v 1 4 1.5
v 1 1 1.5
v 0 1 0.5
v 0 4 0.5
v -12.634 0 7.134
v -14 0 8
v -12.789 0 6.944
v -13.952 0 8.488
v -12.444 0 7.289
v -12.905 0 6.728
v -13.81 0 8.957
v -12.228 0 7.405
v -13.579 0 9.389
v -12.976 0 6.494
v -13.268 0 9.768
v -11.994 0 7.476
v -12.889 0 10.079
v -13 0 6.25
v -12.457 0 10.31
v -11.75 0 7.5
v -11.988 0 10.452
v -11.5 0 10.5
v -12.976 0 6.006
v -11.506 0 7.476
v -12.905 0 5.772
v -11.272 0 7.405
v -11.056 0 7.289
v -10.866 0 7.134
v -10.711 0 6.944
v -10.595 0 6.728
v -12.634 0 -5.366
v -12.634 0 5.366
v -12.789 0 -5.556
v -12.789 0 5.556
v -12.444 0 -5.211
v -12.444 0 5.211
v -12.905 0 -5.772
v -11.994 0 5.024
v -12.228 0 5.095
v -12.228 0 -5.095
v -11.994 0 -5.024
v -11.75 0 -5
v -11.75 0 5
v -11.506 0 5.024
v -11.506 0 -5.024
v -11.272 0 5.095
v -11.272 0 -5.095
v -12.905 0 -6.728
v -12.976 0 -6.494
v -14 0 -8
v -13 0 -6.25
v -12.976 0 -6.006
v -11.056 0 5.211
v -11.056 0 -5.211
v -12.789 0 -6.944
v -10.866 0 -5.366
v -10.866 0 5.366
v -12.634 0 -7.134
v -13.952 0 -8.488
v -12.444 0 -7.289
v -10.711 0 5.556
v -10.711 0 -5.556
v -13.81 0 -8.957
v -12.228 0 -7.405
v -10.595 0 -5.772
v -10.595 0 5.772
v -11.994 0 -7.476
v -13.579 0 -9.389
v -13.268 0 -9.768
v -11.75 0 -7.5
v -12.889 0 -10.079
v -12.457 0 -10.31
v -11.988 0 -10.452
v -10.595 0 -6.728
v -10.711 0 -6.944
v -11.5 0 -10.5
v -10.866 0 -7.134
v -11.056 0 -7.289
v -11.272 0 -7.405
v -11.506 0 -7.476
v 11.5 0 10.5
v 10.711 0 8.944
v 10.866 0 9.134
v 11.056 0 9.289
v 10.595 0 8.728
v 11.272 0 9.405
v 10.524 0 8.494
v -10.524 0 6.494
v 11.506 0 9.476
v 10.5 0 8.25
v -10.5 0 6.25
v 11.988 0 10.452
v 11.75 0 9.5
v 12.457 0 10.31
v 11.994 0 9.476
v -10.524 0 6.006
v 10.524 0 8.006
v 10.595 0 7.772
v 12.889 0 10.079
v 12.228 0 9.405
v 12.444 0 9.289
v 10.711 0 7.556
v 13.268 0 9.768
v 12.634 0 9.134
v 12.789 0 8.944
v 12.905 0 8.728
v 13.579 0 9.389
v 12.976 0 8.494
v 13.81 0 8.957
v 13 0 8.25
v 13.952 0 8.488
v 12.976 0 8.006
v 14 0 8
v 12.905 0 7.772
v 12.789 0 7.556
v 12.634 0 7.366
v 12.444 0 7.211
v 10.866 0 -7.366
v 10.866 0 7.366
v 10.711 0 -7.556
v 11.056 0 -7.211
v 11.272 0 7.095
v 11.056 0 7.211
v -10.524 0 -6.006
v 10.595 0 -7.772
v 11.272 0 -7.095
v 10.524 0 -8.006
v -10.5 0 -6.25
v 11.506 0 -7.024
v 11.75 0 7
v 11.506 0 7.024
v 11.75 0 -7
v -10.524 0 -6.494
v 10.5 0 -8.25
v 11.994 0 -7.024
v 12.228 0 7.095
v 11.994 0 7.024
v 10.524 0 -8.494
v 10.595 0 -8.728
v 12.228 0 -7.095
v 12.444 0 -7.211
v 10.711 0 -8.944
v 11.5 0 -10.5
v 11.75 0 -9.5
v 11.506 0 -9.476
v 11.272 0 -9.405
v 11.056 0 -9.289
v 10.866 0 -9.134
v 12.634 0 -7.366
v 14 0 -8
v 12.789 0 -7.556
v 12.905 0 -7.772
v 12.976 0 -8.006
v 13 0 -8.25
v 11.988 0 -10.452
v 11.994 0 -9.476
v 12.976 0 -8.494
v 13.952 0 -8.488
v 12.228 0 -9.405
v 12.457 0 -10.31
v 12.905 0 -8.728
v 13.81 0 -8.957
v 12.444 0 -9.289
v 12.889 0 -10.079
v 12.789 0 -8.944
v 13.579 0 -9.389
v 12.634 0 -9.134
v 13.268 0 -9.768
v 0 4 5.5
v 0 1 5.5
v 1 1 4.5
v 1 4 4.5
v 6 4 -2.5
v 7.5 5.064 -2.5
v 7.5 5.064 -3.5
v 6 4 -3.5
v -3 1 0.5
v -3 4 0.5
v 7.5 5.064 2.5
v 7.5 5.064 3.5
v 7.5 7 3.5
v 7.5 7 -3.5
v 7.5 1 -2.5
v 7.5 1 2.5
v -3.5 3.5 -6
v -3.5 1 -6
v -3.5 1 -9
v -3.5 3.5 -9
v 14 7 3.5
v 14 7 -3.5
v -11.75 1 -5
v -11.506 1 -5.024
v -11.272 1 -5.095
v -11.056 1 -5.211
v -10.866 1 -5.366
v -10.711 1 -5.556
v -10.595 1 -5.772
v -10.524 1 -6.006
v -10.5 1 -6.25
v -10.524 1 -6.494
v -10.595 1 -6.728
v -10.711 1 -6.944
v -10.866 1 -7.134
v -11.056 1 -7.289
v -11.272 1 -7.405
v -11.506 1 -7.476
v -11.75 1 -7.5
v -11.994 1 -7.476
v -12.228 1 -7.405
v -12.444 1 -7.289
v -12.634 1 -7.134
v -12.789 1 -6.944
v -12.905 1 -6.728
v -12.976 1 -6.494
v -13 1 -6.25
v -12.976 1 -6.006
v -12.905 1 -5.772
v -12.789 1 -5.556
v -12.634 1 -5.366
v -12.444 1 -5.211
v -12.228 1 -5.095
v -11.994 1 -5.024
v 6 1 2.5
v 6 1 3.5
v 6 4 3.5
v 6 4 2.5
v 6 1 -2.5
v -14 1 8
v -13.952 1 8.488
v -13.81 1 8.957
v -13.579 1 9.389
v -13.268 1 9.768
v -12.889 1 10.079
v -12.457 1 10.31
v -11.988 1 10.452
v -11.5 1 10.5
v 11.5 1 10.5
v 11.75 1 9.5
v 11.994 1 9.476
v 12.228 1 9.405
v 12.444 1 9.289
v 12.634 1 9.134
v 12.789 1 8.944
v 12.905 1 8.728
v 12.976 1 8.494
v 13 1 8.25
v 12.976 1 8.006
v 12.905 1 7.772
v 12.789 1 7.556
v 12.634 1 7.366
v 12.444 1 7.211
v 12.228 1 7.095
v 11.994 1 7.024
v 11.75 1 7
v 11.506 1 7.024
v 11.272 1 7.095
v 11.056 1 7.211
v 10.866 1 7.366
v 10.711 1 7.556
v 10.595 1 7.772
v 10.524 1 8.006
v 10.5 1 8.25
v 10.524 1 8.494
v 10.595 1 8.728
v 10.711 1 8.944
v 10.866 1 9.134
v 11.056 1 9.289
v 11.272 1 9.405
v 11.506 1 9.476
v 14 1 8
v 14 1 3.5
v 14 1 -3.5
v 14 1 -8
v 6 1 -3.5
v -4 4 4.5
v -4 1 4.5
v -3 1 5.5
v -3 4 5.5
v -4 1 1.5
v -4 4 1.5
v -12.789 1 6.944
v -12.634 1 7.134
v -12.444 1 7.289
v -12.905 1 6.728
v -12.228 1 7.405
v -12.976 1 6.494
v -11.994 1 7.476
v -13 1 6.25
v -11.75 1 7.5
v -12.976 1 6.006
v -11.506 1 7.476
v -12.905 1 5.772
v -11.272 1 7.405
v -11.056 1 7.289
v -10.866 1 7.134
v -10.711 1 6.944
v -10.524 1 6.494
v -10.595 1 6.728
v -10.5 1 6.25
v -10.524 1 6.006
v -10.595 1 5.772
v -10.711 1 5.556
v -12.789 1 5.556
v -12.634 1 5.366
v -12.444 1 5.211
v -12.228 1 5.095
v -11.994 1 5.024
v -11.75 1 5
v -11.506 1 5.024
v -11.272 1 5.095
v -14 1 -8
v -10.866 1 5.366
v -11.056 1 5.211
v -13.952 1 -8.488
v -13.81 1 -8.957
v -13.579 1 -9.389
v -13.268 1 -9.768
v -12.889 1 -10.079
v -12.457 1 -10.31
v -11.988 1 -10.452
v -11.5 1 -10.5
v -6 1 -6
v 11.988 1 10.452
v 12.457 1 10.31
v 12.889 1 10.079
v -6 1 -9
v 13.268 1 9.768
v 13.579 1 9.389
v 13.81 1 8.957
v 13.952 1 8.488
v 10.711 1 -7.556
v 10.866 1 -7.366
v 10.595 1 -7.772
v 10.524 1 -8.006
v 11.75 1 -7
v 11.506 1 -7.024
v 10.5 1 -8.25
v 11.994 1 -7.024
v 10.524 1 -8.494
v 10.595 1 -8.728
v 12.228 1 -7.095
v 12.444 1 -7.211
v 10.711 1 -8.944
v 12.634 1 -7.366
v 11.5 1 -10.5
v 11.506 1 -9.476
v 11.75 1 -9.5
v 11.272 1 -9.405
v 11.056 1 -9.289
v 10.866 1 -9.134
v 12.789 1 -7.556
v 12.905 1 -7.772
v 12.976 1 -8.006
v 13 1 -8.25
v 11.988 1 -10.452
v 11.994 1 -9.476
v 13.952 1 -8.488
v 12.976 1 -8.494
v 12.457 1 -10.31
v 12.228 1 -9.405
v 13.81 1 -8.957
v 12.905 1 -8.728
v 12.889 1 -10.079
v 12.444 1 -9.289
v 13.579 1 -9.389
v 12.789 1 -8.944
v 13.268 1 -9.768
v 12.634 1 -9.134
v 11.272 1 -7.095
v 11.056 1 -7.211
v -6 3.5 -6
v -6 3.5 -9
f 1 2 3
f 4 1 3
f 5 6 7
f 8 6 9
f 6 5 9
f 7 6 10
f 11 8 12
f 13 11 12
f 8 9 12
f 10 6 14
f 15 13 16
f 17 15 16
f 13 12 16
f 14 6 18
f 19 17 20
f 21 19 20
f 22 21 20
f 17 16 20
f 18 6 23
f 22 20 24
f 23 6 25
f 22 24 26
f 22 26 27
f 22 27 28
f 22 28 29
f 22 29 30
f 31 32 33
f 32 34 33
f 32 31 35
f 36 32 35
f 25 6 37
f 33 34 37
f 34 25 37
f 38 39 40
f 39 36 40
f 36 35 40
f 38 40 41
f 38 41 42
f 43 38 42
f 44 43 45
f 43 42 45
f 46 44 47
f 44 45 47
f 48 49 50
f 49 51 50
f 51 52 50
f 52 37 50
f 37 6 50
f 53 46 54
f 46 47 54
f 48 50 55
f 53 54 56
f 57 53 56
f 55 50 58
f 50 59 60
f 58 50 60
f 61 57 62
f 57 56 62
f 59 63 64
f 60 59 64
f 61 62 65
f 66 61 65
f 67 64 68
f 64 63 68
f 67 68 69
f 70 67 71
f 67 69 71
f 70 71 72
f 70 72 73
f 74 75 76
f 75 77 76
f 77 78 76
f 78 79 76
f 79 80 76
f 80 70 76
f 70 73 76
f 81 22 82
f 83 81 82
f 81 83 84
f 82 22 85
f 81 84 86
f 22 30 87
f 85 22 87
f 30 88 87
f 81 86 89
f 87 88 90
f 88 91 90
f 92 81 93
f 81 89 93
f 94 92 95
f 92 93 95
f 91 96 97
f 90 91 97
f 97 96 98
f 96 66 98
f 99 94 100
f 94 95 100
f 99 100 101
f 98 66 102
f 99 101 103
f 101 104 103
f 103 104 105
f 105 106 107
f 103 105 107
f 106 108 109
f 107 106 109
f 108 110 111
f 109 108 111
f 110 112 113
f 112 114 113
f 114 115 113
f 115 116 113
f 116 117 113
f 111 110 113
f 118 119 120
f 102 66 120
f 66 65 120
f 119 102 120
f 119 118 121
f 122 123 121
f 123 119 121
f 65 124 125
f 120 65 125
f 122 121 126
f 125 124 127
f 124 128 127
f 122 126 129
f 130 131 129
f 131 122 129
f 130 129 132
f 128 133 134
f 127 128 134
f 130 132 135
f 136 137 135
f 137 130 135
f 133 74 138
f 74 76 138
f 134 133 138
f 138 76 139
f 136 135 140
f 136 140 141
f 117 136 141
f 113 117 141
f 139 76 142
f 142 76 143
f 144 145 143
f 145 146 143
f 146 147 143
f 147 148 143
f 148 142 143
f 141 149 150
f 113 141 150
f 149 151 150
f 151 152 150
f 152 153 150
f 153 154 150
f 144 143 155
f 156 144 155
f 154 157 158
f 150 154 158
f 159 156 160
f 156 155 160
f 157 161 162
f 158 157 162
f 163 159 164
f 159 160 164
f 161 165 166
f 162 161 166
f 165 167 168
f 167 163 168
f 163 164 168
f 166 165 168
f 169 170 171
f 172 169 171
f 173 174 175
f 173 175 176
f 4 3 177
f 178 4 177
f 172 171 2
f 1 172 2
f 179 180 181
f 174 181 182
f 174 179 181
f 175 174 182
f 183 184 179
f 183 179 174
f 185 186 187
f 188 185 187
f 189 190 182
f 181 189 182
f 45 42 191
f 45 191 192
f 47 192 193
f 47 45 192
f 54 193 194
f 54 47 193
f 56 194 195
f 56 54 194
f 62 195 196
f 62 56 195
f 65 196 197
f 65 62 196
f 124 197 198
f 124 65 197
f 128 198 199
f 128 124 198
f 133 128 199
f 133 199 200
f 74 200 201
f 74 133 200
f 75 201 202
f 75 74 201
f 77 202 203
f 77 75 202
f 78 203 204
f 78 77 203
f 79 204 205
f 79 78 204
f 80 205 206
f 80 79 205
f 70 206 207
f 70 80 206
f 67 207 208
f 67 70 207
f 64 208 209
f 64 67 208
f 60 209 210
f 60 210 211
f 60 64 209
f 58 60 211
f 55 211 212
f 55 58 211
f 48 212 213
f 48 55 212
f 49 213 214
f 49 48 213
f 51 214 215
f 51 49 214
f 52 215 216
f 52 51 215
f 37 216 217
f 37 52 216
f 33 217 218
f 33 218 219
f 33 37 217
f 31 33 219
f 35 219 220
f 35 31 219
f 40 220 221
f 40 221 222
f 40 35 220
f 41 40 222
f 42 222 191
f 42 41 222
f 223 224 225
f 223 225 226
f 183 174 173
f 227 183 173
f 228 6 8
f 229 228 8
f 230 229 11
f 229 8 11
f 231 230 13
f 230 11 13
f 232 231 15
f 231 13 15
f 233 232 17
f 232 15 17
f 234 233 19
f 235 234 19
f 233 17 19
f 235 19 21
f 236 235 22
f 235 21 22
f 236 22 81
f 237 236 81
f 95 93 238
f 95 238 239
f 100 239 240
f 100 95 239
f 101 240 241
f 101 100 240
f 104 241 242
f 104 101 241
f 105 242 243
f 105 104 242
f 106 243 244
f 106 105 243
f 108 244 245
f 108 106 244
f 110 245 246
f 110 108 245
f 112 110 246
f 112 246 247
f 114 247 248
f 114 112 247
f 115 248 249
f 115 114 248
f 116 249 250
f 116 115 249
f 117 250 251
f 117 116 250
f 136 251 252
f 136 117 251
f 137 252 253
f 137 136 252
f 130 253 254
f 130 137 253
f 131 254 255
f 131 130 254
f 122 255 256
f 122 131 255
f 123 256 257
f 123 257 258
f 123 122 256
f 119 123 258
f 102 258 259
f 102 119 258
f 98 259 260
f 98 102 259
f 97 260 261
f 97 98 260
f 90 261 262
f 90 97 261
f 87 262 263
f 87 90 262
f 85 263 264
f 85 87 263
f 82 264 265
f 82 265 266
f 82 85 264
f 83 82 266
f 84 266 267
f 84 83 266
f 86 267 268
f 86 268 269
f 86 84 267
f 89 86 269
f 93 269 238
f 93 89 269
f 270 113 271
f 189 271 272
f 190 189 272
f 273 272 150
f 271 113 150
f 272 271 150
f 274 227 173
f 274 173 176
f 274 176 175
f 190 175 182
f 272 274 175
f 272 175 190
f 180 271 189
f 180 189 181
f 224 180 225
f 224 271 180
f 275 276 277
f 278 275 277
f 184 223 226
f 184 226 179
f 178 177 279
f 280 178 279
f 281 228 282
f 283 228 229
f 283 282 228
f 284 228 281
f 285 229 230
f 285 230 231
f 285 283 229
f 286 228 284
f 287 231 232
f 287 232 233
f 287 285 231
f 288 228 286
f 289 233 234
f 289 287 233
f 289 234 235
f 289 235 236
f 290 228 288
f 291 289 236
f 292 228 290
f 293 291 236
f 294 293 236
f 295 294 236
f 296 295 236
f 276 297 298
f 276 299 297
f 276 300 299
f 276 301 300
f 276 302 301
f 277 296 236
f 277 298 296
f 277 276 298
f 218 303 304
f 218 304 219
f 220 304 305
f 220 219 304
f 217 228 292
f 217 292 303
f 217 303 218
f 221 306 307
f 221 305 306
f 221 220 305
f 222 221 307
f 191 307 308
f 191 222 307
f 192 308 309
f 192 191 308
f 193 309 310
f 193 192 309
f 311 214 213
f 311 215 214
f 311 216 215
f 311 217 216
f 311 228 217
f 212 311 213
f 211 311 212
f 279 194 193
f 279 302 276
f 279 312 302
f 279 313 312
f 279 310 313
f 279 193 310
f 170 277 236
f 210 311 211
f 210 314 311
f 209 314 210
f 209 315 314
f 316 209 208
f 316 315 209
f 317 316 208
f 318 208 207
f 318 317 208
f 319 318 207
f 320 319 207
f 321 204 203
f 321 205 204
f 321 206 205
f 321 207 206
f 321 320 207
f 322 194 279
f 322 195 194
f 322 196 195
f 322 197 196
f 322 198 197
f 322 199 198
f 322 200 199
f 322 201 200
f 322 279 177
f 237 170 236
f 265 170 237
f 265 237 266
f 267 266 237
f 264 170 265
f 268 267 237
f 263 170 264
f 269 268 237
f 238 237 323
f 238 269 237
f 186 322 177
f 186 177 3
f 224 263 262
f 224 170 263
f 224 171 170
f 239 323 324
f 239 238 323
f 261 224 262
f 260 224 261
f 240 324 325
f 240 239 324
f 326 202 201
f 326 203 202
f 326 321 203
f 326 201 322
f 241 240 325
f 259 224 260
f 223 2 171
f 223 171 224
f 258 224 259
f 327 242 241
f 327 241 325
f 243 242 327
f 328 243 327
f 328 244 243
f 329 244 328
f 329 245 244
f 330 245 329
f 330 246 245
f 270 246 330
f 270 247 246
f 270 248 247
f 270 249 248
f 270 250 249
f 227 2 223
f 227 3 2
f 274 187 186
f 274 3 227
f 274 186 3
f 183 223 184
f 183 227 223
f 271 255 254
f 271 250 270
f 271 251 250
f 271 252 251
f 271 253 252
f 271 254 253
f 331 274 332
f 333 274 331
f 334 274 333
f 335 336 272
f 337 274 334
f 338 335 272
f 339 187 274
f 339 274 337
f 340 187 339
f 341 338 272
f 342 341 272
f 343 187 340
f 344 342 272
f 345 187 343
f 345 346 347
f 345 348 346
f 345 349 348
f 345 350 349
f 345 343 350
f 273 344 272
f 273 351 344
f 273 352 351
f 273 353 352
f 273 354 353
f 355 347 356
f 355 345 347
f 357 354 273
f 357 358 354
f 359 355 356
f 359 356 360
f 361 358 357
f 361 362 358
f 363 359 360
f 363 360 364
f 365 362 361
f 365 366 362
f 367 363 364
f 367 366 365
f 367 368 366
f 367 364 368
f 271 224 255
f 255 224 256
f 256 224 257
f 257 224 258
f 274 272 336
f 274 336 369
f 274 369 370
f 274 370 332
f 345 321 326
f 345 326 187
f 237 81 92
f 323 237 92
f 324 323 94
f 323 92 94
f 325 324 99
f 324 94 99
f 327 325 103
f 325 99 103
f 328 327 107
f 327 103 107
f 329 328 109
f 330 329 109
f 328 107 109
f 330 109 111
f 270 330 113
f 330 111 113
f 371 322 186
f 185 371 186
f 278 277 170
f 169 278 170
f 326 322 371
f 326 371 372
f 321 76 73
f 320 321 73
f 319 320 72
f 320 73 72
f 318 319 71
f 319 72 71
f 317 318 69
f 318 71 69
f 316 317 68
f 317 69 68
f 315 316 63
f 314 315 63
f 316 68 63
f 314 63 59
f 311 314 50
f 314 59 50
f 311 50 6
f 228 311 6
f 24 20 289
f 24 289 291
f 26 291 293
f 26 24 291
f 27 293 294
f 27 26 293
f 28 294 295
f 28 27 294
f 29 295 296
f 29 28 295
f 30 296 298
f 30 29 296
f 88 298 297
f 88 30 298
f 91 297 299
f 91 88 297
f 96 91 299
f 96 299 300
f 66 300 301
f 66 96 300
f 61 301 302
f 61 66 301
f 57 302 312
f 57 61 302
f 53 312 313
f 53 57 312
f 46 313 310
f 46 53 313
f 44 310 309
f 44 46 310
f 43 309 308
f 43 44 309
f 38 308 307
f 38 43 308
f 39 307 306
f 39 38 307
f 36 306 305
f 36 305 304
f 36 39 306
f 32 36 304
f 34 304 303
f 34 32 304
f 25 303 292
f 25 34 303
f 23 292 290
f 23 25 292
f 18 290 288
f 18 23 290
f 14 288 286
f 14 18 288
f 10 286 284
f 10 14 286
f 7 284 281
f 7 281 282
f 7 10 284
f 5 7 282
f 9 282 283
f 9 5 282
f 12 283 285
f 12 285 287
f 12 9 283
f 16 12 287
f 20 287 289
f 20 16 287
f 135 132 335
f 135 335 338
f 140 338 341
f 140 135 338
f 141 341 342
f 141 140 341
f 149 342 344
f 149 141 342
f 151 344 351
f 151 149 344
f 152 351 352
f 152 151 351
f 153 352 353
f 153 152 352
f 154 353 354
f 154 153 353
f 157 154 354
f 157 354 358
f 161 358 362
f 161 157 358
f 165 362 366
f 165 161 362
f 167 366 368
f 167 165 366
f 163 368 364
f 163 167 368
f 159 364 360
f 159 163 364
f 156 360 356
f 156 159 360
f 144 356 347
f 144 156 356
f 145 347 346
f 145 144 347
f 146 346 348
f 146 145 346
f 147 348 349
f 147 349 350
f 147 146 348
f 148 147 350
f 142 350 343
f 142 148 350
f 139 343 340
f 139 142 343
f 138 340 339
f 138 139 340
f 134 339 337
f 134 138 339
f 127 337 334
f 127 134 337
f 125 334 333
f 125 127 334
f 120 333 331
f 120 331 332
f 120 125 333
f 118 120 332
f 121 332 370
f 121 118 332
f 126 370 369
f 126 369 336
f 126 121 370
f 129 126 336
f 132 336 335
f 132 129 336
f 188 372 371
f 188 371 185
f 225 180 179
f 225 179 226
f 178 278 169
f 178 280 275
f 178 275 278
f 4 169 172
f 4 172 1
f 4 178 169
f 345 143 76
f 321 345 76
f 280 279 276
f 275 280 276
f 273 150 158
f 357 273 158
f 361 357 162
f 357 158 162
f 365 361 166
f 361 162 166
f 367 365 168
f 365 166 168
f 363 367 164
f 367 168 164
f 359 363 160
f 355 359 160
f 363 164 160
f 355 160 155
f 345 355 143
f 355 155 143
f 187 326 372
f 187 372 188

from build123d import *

# Parameters (mm, degrees)
CROQUIS1_R              = 1.25
SALIENTE_EXTRUIR1_DEPTH = 1
SALIENTE_EXTRUIR2_DEPTH = 6
CORTAR_EXTRUIR1_DEPTH   = 22
SALIENTE_EXTRUIR3_DEPTH = 3
CROQUIS5_W              = 2.5
CROQUIS5_H              = 3
SALIENTE_EXTRUIR4_DEPTH = 2.5


with BuildPart() as part:
    # Croquis1 → Saliente-Extruir1 (new body)
    with BuildSketch(Plane(origin=(0, 0, 0), x_dir=(1, 0, 0), z_dir=(0, 1, 0))):
        with BuildLine():
            Line((-11.5, -10.5), (11.5, -10.5))
            ThreePointArc((11.5, -10.5), (13.267766953, -9.767766953), (14, -8))
            Line((14, -8), (14, 8))
            ThreePointArc((14, 8), (13.267766953, 9.767766953), (11.5, 10.5))
            Line((11.5, 10.5), (-11.5, 10.5))
            ThreePointArc((-11.5, 10.5), (-13.267766953, 9.767766953), (-14, 8))
            Line((-14, 8), (-14, -8))
            ThreePointArc((-14, -8), (-13.267766953, -9.767766953), (-11.5, -10.5))
        make_face()
        with Locations(Location((11.75, -8.25, 0), (0, 0, 270))):
            Circle(CROQUIS1_R, mode=Mode.SUBTRACT)
        with Locations(Location((11.75, 8.25, 0), (0, 0, 270))):
            Circle(CROQUIS1_R, mode=Mode.SUBTRACT)
        with Locations(Location((-11.75, 6.25, 0), (0, 0, 270))):
            Circle(CROQUIS1_R, mode=Mode.SUBTRACT)
        with Locations(Location((-11.75, -6.25, 0), (0, 0, 270))):
            Circle(CROQUIS1_R, mode=Mode.SUBTRACT)
    extrude(amount=SALIENTE_EXTRUIR1_DEPTH)

    # Croquis2 → Saliente-Extruir2 (add)
    with BuildSketch(Plane(origin=(0, 1, 0), x_dir=(1, 0, 0), z_dir=(0, 1, 0))):
        Polygon((14, -3.5), (6, -3.5), (6, -2.5), (7.5, -2.5), (7.5, 2.5), (6, 2.5), (6, 3.5), (14, 3.5), align=None)
    extrude(amount=SALIENTE_EXTRUIR2_DEPTH)

    # Croquis3 → Cortar-Extruir1 (cut, through all)
    with BuildSketch(Plane.XY.offset(3.5)):
        Polygon((7.5, 7), (7.5, 5.064017175), (6, 4), (6, 7), align=None)
    extrude(amount=-CORTAR_EXTRUIR1_DEPTH, mode=Mode.SUBTRACT)

    # Croquis4 → Saliente-Extruir3 (add)
    with BuildSketch(Plane(origin=(0, 1, 0), x_dir=(1, 0, 0), z_dir=(0, 1, 0))):
        Polygon((-3, -5.5), (0, -5.5), (1, -4.5), (1, -1.5), (0, -0.5), (-3, -0.5), (-4, -1.5), (-4, -4.5), align=None)
    extrude(amount=SALIENTE_EXTRUIR3_DEPTH)

    # Croquis5 → Saliente-Extruir4 (add)
    with BuildSketch(Plane(origin=(0, 1, 0), x_dir=(1, 0, 0), z_dir=(0, 1, 0))):
        with Locations((-4.75, 7.5)):
            Rectangle(CROQUIS5_W, CROQUIS5_H)
    extrude(amount=SALIENTE_EXTRUIR4_DEPTH)


solid = part.part
